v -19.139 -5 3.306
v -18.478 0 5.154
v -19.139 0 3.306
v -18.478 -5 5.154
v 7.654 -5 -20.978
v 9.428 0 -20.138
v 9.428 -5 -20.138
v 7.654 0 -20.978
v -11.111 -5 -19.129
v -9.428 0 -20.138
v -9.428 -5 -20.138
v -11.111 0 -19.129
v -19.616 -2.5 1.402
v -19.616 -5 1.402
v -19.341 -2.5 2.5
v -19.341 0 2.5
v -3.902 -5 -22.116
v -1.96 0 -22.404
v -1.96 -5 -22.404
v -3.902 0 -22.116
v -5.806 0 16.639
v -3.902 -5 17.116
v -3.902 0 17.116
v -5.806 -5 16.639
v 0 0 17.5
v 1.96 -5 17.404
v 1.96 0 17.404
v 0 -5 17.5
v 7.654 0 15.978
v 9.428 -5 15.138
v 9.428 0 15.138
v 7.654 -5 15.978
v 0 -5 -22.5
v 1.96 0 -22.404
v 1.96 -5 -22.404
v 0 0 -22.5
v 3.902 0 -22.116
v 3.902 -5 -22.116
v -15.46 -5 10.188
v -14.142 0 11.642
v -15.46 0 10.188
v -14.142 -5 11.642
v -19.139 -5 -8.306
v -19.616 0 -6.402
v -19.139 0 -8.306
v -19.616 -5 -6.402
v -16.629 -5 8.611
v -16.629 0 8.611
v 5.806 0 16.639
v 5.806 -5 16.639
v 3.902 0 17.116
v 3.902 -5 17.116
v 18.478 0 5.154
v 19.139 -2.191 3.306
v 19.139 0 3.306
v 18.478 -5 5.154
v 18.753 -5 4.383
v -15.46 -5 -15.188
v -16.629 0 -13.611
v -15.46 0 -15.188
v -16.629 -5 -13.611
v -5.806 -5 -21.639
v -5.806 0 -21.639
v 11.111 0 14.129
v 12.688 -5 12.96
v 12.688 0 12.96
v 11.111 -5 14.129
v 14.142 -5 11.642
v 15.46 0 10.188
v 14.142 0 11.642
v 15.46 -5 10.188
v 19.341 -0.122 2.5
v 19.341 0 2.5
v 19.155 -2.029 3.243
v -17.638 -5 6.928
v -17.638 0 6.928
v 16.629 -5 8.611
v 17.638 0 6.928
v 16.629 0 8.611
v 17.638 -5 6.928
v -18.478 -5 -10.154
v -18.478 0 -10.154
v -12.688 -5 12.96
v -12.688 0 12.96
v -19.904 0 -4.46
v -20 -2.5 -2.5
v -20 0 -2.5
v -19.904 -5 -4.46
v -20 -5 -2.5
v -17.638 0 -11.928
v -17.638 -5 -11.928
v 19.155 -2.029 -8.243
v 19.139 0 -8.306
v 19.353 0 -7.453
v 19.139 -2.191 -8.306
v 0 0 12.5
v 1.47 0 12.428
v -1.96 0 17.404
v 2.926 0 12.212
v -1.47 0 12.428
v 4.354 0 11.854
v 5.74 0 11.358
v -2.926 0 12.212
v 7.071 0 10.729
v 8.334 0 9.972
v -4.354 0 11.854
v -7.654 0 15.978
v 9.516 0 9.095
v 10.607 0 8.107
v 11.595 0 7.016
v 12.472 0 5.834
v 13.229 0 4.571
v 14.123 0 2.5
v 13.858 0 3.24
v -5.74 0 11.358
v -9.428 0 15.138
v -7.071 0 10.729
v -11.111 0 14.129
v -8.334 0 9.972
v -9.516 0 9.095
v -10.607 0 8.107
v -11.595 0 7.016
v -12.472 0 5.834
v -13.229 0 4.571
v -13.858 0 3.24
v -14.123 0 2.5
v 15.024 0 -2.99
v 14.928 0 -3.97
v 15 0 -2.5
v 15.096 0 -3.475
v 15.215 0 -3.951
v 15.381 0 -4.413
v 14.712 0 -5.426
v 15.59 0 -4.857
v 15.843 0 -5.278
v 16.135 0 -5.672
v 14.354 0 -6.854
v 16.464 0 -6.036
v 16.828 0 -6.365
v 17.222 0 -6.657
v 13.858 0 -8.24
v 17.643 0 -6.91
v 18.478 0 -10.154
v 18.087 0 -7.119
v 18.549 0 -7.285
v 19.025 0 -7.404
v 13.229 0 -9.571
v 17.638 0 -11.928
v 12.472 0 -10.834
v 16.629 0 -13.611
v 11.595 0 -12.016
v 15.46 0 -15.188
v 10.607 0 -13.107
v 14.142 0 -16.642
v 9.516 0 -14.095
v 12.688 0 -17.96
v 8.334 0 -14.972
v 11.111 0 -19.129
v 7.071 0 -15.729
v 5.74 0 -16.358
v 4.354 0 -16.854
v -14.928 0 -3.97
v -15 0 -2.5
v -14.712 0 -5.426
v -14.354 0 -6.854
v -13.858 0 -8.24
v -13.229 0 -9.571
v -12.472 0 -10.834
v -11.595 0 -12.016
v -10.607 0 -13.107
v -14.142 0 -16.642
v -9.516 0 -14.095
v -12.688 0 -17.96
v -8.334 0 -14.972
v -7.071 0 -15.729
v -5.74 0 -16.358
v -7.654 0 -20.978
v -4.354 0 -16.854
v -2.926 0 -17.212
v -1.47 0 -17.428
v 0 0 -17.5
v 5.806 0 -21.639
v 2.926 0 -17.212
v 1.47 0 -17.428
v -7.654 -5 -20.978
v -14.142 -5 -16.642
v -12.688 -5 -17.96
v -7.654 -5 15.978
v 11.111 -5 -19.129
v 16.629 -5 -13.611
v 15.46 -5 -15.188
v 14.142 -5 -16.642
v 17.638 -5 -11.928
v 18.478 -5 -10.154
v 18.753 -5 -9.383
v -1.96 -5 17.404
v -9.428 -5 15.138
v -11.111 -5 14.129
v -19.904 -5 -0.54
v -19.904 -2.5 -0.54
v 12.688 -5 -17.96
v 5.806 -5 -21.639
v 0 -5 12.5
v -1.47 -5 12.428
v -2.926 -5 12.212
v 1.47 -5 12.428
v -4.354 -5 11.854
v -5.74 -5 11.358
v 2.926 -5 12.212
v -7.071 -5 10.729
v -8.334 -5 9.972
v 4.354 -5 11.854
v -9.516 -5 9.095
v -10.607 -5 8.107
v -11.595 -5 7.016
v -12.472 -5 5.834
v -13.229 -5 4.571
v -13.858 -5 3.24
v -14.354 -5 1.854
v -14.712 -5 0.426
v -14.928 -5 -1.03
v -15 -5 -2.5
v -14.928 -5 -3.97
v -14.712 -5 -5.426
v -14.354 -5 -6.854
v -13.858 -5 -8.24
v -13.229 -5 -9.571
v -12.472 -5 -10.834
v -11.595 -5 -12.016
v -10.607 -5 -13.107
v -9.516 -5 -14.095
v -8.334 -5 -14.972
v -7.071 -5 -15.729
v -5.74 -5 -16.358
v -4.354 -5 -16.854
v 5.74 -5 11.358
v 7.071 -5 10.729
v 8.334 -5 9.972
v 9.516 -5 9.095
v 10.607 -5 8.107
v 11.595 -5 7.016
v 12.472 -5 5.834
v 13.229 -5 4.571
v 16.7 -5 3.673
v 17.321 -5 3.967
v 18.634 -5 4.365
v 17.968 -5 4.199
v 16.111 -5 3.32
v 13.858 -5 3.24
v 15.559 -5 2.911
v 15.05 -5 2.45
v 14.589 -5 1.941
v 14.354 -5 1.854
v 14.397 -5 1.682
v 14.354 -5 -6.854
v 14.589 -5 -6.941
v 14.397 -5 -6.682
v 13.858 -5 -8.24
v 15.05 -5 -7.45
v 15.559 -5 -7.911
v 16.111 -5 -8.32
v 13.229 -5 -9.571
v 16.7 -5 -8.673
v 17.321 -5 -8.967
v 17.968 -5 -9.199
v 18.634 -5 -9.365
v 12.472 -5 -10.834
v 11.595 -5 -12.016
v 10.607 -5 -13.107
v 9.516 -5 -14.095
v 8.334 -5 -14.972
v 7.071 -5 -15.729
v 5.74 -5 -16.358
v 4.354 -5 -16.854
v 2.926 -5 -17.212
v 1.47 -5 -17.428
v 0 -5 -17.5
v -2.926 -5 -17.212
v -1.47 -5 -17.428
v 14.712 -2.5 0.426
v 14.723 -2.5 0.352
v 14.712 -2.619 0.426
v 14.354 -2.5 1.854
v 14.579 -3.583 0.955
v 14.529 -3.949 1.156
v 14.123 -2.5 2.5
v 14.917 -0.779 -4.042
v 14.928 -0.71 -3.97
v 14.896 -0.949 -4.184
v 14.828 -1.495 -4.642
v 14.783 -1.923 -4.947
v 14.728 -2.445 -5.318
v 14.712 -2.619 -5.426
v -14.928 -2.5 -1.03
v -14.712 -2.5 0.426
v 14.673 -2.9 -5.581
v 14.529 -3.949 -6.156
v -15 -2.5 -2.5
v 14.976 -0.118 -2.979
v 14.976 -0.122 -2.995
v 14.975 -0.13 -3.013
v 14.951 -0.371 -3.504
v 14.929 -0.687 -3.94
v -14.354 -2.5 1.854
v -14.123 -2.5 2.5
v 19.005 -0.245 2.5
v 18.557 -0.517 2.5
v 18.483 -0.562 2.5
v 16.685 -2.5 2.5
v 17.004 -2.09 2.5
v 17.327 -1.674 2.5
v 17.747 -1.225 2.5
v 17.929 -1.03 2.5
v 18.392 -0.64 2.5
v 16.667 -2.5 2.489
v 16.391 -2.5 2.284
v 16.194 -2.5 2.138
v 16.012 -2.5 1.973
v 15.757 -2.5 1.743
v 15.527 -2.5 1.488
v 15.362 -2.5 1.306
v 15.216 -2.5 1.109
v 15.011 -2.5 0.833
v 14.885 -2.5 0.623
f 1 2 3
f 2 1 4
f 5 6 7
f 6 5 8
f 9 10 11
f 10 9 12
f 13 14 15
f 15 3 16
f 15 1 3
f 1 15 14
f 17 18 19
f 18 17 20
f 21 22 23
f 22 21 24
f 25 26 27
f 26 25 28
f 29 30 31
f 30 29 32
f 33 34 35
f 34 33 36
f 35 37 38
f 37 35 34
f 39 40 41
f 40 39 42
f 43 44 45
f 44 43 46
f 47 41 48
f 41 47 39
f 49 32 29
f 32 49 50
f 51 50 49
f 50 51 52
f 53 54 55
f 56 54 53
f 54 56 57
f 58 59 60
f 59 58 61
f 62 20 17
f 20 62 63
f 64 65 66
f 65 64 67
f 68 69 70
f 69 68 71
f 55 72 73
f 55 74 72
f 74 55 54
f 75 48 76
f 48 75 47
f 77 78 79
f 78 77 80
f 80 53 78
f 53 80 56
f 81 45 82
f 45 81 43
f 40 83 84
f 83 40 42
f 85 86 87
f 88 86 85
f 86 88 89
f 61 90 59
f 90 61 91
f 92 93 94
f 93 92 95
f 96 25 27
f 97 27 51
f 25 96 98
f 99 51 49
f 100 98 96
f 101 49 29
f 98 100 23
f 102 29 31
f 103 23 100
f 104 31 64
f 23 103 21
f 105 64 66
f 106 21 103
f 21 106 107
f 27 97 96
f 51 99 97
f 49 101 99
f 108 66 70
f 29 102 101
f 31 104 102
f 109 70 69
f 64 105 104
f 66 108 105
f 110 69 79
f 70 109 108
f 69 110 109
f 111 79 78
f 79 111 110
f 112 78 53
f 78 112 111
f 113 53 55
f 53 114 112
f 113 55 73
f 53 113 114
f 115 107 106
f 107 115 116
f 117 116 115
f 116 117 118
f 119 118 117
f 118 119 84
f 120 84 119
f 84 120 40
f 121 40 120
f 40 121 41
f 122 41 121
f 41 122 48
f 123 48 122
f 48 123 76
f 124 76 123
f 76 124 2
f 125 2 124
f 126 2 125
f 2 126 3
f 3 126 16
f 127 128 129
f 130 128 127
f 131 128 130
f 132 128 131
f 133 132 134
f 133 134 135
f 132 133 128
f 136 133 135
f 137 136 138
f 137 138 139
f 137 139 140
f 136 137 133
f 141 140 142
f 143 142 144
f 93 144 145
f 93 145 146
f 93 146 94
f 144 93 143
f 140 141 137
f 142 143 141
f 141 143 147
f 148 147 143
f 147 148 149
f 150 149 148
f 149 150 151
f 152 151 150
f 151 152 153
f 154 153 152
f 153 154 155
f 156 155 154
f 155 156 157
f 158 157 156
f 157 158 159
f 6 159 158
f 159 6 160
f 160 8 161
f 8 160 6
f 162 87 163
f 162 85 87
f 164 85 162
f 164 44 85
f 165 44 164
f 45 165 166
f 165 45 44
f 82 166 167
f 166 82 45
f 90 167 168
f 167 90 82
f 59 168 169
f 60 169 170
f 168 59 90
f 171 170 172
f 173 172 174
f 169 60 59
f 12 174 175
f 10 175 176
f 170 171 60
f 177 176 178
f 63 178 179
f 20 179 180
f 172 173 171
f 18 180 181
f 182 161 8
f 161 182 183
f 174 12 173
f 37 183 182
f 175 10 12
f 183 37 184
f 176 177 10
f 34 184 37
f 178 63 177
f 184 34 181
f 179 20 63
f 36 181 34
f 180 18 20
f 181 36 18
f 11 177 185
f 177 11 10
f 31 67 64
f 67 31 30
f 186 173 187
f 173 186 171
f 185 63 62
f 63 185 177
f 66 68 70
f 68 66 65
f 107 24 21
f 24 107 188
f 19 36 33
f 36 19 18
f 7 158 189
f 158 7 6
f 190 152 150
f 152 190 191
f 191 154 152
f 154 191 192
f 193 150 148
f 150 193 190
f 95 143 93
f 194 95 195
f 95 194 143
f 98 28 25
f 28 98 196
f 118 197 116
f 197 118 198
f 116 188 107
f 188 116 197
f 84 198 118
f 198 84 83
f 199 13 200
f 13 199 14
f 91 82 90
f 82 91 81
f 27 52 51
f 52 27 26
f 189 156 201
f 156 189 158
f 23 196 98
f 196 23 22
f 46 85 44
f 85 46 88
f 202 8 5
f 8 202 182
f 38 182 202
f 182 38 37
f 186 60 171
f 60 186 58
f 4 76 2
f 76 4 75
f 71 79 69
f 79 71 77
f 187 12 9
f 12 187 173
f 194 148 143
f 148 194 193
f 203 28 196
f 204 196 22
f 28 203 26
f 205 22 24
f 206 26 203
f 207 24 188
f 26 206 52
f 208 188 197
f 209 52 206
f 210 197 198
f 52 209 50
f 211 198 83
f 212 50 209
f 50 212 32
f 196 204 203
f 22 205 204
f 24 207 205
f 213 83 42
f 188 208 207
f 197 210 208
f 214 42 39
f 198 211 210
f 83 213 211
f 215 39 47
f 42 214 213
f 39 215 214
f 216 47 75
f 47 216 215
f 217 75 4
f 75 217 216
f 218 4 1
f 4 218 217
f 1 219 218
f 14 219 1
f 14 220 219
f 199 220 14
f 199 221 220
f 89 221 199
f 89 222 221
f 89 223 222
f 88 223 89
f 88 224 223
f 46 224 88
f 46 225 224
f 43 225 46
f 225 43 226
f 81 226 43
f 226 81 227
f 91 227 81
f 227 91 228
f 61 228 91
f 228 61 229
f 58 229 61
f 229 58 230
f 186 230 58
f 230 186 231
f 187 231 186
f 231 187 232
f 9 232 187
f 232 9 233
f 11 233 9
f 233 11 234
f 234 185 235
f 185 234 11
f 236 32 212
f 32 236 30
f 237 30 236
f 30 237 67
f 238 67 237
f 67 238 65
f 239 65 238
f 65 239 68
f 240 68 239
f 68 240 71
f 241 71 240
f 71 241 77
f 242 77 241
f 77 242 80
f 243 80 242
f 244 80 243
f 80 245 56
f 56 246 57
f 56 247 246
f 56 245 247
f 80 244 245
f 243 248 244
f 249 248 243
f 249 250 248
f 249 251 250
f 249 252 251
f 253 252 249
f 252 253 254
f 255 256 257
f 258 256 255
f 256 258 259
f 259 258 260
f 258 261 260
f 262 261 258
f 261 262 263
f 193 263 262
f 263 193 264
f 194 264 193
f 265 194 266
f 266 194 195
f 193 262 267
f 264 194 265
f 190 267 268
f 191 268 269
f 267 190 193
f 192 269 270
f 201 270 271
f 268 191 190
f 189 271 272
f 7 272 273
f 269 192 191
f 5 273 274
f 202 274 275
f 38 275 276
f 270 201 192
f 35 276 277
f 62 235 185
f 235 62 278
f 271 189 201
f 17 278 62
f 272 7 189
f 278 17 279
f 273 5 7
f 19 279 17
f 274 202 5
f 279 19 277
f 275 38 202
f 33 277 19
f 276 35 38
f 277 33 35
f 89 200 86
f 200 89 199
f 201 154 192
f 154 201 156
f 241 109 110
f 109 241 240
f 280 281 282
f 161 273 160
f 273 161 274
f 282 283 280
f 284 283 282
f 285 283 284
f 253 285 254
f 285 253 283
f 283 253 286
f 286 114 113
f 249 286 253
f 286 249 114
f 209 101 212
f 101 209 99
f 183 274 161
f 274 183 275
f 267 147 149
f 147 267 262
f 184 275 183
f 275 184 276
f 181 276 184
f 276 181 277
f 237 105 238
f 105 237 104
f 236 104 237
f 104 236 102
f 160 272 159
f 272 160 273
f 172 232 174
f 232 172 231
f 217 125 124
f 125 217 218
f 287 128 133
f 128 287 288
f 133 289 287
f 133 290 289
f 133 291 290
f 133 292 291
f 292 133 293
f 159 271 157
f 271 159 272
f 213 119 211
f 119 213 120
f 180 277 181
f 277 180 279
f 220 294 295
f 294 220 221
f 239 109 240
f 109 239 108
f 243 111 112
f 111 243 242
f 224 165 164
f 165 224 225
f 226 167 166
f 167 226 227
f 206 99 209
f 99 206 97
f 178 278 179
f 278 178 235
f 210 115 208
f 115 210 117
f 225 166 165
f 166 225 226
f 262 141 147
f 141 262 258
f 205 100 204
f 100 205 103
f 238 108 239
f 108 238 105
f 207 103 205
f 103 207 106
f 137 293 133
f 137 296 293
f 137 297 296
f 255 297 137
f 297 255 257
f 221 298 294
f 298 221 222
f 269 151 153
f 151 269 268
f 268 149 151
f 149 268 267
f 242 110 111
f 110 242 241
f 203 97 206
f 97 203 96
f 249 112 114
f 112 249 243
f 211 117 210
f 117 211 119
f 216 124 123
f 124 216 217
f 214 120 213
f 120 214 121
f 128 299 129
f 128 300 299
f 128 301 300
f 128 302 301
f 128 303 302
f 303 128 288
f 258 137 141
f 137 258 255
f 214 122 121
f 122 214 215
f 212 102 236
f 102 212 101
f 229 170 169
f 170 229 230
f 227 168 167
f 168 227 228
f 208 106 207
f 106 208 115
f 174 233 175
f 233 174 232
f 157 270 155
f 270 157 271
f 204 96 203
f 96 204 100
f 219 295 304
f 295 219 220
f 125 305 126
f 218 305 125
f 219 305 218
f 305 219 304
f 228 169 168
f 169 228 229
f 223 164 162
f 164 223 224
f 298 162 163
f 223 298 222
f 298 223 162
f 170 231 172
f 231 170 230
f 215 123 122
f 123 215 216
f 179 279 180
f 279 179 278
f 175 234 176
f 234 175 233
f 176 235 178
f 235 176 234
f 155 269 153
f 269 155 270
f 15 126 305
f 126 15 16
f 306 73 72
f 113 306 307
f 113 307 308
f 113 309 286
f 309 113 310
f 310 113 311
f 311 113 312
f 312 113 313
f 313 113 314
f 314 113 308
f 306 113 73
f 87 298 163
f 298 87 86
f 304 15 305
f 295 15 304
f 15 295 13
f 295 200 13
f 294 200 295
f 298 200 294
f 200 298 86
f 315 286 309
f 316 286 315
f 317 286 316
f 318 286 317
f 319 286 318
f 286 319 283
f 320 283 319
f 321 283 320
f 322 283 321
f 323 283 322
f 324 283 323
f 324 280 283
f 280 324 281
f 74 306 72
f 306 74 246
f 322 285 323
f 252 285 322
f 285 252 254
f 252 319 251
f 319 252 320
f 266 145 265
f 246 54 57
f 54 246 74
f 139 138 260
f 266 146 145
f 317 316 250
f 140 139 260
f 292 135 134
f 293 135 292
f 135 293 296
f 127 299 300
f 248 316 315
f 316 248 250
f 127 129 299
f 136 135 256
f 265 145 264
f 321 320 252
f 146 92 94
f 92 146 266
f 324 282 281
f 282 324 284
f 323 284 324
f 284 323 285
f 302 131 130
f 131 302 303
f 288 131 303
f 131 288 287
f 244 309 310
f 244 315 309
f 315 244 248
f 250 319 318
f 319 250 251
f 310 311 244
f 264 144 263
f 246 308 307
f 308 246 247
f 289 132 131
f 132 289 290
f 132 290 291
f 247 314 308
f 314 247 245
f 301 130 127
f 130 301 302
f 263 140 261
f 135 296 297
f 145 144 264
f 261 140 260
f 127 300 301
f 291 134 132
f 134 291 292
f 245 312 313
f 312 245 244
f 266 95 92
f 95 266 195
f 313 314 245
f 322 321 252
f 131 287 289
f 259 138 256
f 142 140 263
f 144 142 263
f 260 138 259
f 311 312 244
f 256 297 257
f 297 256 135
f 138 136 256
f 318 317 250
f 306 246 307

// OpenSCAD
module c_shaped_clip() {
    $fn = 64;
    difference() {
        // Outer ring
        translate([0, 0, -2.5])
        rotate([90, 0, 0])
        cylinder(r=20, h=5);

        // Inner void
        translate([0, 0, -2.5])
        rotate([90, 0, 0])
        cylinder(r=15, h=5);

        // Gap
        translate([-20, -2.5, -2.5])
        cube([40, 5, 5]);

        // Bulbous end
        translate([20, 0, -2.5])
        rotate([90, 0, 0])
        cylinder(r1=5, r2=7, h=5);
    }
}

c_shaped_clip();
